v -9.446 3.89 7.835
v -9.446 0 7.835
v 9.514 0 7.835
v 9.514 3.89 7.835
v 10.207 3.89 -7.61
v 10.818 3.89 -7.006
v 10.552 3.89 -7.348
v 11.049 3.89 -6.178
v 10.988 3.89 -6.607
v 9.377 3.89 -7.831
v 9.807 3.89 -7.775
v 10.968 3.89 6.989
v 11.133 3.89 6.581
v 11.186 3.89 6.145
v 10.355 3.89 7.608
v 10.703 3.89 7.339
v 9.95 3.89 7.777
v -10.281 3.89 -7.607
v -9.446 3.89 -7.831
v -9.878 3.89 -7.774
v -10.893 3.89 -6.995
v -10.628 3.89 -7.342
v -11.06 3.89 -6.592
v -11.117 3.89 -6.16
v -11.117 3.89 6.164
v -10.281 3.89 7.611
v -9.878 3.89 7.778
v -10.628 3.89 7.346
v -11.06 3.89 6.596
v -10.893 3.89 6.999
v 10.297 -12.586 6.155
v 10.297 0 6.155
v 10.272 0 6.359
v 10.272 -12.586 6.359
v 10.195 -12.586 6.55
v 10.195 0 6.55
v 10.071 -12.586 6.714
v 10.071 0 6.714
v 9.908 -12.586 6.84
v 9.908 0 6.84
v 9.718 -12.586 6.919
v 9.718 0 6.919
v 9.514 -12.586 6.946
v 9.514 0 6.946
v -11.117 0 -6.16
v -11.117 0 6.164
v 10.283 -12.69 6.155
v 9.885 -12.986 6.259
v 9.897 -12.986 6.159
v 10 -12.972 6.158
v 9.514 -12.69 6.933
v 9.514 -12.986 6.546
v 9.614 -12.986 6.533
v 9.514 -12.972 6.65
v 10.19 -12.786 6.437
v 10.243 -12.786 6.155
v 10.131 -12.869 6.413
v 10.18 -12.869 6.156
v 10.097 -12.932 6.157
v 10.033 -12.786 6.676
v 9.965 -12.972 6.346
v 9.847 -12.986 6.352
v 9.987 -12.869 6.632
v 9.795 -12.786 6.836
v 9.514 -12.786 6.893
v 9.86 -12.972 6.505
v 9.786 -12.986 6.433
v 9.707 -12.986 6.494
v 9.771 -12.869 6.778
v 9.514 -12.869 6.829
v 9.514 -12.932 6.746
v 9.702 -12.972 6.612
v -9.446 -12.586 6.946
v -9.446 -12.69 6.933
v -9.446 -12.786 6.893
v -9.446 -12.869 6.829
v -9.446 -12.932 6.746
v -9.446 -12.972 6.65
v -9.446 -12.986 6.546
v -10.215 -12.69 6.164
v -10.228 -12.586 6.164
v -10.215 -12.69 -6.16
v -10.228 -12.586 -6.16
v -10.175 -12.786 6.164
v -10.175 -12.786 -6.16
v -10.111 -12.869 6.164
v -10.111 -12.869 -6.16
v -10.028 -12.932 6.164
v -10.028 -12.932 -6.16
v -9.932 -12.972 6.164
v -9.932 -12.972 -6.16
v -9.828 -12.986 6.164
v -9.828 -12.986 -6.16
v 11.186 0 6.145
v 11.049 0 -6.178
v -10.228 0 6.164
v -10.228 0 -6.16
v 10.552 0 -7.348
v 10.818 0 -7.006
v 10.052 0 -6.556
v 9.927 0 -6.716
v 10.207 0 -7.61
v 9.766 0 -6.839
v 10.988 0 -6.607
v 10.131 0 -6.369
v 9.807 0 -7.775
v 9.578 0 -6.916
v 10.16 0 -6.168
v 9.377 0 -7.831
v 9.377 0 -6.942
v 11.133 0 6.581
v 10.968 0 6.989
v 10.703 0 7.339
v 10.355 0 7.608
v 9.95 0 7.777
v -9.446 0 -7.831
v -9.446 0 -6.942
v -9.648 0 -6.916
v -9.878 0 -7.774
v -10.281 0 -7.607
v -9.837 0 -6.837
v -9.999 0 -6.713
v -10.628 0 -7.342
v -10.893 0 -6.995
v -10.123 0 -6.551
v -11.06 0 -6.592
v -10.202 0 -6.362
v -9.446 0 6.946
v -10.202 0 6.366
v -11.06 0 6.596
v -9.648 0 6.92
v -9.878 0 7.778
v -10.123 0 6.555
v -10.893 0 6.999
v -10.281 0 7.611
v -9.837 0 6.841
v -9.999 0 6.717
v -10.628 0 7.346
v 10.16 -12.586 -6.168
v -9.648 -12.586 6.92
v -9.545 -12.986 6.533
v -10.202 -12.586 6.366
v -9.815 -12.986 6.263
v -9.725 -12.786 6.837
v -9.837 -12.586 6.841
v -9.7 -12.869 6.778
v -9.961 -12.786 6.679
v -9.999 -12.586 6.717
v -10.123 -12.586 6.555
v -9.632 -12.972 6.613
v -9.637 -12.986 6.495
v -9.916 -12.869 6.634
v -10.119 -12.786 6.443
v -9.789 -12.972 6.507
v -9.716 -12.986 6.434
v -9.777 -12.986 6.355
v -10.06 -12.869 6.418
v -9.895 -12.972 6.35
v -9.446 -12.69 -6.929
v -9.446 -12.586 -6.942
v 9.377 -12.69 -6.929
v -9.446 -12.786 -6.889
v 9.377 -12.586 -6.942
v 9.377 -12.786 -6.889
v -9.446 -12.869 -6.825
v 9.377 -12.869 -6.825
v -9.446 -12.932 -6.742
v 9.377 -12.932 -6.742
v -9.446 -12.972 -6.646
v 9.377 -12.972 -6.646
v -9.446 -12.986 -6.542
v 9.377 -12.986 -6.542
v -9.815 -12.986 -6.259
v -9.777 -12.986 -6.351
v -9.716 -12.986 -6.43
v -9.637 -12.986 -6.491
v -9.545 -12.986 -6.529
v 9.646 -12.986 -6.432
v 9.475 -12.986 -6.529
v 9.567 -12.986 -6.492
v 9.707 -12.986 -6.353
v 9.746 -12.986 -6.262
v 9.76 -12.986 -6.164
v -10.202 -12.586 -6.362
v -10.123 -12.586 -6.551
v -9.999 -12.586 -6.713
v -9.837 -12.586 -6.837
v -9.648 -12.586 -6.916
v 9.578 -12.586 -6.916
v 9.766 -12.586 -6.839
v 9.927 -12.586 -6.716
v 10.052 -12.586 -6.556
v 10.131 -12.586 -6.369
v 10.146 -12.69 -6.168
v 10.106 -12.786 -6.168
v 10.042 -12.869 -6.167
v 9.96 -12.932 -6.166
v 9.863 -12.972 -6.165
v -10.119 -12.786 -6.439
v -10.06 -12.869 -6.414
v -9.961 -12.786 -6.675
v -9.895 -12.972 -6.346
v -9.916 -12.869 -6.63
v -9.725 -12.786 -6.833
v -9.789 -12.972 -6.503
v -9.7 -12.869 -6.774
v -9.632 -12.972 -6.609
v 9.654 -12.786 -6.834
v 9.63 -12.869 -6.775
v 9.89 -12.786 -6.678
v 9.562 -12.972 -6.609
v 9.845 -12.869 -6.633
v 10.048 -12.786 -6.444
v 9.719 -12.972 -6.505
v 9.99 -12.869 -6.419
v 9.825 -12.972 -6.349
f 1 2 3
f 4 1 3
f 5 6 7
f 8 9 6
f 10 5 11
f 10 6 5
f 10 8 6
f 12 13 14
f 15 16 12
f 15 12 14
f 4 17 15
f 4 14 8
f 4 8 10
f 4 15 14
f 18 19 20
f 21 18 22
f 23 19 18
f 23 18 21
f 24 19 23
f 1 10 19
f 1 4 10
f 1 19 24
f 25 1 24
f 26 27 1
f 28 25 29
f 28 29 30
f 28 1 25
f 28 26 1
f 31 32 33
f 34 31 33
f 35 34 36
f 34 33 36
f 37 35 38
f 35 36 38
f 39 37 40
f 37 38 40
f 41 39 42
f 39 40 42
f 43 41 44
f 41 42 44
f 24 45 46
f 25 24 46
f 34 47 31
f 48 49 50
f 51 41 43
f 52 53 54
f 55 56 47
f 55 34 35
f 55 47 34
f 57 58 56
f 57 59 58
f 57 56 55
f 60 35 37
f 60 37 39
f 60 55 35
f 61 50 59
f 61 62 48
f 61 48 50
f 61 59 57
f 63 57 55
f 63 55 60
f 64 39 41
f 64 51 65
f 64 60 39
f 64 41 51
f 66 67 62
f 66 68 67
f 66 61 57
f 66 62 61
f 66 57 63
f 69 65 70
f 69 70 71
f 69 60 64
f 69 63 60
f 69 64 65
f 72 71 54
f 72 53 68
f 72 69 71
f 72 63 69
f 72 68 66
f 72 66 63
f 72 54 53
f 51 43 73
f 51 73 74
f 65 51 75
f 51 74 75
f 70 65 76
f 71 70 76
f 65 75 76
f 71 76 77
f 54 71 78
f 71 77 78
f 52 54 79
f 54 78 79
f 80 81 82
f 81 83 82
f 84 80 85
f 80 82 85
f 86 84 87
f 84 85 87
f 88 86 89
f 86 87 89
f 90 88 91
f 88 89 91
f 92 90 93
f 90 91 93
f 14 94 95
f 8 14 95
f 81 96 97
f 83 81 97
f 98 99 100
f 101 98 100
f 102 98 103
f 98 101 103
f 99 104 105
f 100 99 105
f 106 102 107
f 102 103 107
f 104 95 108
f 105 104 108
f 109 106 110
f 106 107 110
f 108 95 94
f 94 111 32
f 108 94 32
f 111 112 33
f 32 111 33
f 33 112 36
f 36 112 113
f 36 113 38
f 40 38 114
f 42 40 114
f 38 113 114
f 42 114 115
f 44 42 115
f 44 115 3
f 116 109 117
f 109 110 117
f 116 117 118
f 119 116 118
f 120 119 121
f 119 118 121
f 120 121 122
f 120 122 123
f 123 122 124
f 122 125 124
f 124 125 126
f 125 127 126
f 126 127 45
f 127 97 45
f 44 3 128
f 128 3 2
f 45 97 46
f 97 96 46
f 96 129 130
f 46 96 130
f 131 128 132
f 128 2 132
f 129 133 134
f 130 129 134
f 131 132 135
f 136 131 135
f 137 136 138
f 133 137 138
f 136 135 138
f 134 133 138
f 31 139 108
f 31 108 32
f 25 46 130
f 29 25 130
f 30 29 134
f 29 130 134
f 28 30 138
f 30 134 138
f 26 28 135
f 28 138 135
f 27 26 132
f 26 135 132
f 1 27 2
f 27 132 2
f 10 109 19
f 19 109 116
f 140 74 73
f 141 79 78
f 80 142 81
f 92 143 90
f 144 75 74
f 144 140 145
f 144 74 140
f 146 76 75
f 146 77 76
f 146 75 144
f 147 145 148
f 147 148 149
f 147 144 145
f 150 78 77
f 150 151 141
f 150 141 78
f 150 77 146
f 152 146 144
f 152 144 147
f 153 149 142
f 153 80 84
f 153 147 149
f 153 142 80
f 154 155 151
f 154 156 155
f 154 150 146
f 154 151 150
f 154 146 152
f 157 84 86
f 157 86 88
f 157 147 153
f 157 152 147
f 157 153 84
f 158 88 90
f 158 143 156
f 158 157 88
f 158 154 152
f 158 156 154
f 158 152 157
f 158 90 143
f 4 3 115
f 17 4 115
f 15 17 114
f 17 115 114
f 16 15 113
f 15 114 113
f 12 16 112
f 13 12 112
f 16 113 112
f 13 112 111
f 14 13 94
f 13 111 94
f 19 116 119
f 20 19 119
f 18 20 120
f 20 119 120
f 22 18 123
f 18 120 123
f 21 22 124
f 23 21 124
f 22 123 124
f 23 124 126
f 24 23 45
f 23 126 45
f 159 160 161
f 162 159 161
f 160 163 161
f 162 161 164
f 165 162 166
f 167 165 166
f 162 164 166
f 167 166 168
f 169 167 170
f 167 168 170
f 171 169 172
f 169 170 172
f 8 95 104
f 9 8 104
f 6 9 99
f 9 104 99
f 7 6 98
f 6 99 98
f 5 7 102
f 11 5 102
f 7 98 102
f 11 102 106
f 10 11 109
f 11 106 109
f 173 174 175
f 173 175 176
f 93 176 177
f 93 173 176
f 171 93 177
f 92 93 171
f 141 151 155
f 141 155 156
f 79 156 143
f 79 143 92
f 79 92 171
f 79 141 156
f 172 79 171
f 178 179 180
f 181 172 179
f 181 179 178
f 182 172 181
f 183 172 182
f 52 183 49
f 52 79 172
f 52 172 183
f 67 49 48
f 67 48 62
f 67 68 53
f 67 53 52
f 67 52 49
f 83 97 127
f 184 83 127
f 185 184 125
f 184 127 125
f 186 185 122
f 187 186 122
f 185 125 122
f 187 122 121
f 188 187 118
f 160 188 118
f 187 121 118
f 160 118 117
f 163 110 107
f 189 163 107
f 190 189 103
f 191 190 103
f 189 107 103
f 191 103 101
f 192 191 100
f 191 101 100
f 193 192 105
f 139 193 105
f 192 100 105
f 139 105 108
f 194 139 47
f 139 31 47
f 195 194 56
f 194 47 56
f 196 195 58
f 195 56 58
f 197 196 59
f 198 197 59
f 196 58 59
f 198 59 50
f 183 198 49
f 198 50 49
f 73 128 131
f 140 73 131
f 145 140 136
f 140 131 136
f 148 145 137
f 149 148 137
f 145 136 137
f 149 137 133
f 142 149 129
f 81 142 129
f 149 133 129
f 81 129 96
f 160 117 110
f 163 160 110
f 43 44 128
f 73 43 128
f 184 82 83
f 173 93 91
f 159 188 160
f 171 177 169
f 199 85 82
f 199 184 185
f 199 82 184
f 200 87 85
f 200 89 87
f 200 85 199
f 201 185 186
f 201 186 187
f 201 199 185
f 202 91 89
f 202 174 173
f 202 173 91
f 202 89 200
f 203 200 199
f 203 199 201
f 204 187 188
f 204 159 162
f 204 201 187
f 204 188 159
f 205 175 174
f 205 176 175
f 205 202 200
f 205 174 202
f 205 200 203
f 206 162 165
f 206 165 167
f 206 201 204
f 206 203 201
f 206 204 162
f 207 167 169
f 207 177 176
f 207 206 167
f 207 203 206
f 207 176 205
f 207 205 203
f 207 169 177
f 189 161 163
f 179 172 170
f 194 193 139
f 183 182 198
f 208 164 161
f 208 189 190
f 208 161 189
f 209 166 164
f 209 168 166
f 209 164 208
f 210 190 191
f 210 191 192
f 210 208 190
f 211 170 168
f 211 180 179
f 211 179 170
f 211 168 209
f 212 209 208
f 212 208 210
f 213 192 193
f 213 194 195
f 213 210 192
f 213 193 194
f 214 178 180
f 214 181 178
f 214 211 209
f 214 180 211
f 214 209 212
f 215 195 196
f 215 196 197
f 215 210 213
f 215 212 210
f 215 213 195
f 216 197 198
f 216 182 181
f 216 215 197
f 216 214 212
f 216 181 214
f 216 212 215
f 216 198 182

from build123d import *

# Parameters (mm, degrees)
F1_DEPTH = 12.986
F3_DEPTH = 3.89
F4_R     = 0.4


with BuildPart() as f1:
    # F0 (on Front) → F1 (new body)
    with BuildSketch(Plane.XZ):
        with BuildLine():
            Line((9.514224, 6.946266), (-9.445541, 6.946266))
            ThreePointArc((-9.445541, 6.946266), (-9.999012, 6.717011), (-10.228267, 6.16354))
            Line((-10.228267, 6.16354), (-10.228267, -6.159592))
            ThreePointArc((-10.228267, -6.159592), (-9.999012, -6.713063), (-9.445541, -6.942318))
            Line((-9.445541, -6.942318), (9.376897, -6.942318))
            ThreePointArc((9.376897, -6.942318), (9.927276, -6.716138), (10.159575, -6.168314))
            Line((10.159575, -6.168314), (10.296901, 6.154818))
            ThreePointArc((10.296901, 6.154818), (10.07077, 6.713918), (9.514224, 6.946266))
        make_face()
    extrude(amount=F1_DEPTH)

    # F2 (on face) → F3 (join)
    with BuildSketch(Plane(origin=(0, 0, 0), x_dir=(-1, 0, 0), z_dir=(0, 1, 0))):
        with BuildLine():
            Line((11.117267, -6.159592), (11.117267, 6.16354))
            ThreePointArc((11.117267, 6.16354), (10.62763, 7.345628), (9.445541, 7.835266))
            Line((9.445541, 7.835266), (-9.514224, 7.835266))
            ThreePointArc((-9.514224, 7.835266), (-10.70288, 7.339024), (-11.185846, 6.144911))
            Line((-11.185846, 6.144911), (-11.048519, -6.17822))
            ThreePointArc((-11.048519, -6.17822), (-10.552381, -7.348248), (-9.376897, -7.831318))
            Line((-9.376897, -7.831318), (9.445541, -7.831318))
            ThreePointArc((9.445541, -7.831318), (10.62763, -7.341681), (11.117267, -6.159592))
        make_face()
        with BuildLine():
            Line((-10.159575, -6.168314), (-10.296901, 6.154818))
            ThreePointArc((-10.296901, 6.154818), (-10.07077, 6.713918), (-9.514224, 6.946266))
            Line((-9.514224, 6.946266), (9.445541, 6.946266))
            ThreePointArc((9.445541, 6.946266), (9.999012, 6.717011), (10.228267, 6.16354))
            Line((10.228267, 6.16354), (10.228267, -6.159592))
            ThreePointArc((10.228267, -6.159592), (9.999012, -6.713063), (9.445541, -6.942318))
            Line((9.445541, -6.942318), (-9.376897, -6.942318))
            ThreePointArc((-9.376897, -6.942318), (-9.927276, -6.716138), (-10.159575, -6.168314))
        make_face(mode=Mode.SUBTRACT)
        with BuildLine():
            ThreePointArc((-9.514224, 6.946266), (-10.07077, 6.713918), (-10.296901, 6.154818))
            Line((-10.296901, 6.154818), (-10.159575, -6.168314))
            ThreePointArc((-10.159575, -6.168314), (-9.927276, -6.716138), (-9.376897, -6.942318))
            Line((-9.376897, -6.942318), (9.445541, -6.942318))
            ThreePointArc((9.445541, -6.942318), (9.999012, -6.713063), (10.228267, -6.159592))
            Line((10.228267, -6.159592), (10.228267, 6.16354))
            ThreePointArc((10.228267, 6.16354), (9.999012, 6.717011), (9.445541, 6.946266))
            Line((9.445541, 6.946266), (-9.514224, 6.946266))
        make_face()
    extrude(amount=F3_DEPTH)

    # F4
    f4_edges = [f1.edges().sort_by_distance(p)[0] for p in [
        (10.07077, -12.986, 6.713918),
        (0.034341, -12.986, 6.946266),
        (-9.999012, -12.986, 6.717011),
        (-10.228267, -12.986, 0.001974),
        (-9.999012, -12.986, -6.713063),
        (-0.034322, -12.986, -6.942318),
        (9.927276, -12.986, -6.716138),
        (10.228238, -12.986, -0.006748),
    ]]
    fillet(f4_edges, radius=F4_R)


solid = f1.part
